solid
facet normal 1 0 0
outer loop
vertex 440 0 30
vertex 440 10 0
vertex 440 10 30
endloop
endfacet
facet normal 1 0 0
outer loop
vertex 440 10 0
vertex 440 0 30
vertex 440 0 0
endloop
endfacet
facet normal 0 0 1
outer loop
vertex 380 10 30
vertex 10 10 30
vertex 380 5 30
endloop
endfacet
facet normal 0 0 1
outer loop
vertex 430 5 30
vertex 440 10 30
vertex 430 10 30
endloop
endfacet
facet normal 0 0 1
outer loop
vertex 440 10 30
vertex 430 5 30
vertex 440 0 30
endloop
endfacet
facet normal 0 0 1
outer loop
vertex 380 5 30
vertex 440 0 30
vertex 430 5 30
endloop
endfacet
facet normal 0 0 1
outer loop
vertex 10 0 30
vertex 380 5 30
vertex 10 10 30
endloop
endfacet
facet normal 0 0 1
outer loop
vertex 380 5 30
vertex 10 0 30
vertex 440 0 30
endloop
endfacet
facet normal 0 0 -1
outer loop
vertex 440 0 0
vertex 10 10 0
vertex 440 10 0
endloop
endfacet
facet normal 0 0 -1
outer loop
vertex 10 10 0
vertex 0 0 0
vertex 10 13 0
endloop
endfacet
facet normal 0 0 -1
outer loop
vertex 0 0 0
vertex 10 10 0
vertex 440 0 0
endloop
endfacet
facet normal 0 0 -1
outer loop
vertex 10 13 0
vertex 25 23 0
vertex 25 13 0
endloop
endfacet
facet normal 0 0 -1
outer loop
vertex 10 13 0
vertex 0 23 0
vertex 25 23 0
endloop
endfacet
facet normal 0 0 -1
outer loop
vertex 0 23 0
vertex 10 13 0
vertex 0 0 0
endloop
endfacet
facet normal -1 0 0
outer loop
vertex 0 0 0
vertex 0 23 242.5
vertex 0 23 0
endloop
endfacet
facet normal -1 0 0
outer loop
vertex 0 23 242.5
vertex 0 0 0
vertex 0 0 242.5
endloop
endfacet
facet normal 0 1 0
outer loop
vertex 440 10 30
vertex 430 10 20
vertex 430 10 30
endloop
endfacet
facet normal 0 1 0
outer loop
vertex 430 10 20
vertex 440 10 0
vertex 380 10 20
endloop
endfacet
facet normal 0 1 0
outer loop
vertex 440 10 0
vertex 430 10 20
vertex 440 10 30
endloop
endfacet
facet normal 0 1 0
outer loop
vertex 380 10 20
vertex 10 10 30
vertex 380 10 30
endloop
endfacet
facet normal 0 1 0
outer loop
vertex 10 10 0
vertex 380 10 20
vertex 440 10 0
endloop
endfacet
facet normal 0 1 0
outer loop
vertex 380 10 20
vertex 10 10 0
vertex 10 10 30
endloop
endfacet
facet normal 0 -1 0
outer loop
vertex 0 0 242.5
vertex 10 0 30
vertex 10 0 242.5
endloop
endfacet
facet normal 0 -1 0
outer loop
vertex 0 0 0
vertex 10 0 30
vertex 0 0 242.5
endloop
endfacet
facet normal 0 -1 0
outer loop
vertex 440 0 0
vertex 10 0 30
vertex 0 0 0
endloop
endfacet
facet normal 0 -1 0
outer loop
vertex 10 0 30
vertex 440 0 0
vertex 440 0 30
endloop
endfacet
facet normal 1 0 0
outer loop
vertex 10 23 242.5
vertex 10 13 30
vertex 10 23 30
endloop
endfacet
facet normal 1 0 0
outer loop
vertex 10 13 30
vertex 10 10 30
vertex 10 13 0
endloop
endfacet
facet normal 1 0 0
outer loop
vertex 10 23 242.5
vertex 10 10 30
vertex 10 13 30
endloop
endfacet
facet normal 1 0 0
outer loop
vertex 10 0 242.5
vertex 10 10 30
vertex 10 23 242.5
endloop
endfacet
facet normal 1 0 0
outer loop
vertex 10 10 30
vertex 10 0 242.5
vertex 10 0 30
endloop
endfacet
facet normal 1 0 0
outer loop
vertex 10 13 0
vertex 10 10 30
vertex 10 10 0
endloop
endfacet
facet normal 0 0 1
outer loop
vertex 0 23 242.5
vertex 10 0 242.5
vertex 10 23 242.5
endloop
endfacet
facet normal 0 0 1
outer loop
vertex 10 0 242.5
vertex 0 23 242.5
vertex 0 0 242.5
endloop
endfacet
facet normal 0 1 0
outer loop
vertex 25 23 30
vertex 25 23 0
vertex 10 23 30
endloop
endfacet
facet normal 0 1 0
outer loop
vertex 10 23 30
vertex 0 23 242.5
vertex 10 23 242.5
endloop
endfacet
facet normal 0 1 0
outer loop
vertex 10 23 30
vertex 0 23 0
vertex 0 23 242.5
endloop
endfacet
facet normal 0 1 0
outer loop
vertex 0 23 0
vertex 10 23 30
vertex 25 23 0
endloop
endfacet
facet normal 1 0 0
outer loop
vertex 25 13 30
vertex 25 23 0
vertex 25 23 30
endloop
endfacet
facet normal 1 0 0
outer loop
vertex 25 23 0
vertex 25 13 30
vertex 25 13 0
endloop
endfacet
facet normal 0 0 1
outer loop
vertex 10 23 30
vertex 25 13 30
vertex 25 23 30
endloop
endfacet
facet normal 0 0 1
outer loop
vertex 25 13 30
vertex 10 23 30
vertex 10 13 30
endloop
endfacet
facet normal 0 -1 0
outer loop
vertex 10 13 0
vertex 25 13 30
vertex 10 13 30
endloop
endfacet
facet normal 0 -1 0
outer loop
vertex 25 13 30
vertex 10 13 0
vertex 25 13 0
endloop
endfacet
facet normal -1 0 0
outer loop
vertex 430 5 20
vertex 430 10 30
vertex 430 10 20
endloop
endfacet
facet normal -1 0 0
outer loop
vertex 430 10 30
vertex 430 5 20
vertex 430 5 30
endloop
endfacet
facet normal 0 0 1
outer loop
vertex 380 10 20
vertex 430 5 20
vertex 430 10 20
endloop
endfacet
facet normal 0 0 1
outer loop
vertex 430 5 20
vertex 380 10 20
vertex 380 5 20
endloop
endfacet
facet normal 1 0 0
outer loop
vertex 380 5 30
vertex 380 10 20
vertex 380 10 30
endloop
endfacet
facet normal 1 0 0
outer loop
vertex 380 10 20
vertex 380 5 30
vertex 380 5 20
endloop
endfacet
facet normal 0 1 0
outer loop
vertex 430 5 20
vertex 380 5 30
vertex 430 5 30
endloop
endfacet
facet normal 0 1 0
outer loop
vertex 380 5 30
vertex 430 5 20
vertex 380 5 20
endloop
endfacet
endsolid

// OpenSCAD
render_part_1 = true;
render_part_2 = false;
render_part_3 = false;

beam_length = 440;
beam_width = 30;
beam_thickness = 10;
beam_hook_length = 15;
beam_hook_depth = 3;

hinge_bracket_height = 48;
hinge_pin_diameter = 10;
hinge_pin_spacing = 0.6;
hinge_pin_head_spacing = 1;
hinge_pin_wall = 7;
hinge_pin_overall_diameter = hinge_pin_diameter + 2 * hinge_pin_wall;
hinge_pin_steps = $preview ? 15 : 90;
hinge_pin_ramp_height = 5;

hinge_bracket_cutaway_start = beam_length - hinge_bracket_height - beam_thickness - 1;
hinge_bracket_width = beam_width + 1.5 * beam_thickness;

hinge_pin_head_height = 30;

pin_to_wall_distance = 0.5 * hinge_pin_overall_diameter + 1.45 * beam_thickness;

cell_phone_width = 170;
cell_phone_height = 85;
cell_phone_thickness = 19;

cell_phone_opening_start = 16;
cell_phone_opening_length = 41;
cell_phone_opening_thickness = 12;

bucket_wall_thickness = 3;
bucket_floor_thickness = 12;
bucket_floor_angle = 35;
bucket_width = cell_phone_width + 2 * bucket_wall_thickness;
bucket_height = cell_phone_height + bucket_floor_thickness + hinge_pin_head_height;
bucket_thickness = cell_phone_thickness + 2 * bucket_wall_thickness;

bucket_retainer_width = 5;
bucket_retainer_height = cell_phone_height / 5;

part_2_y_offset = 60;
part_3_y_offset = 120;

// Part 1: Bracket that hangs off top of shower frame
if (render_part_1)
difference()
{
  union()
  {
    cube([beam_length, beam_thickness, beam_width]);

    cube([beam_thickness, 2 * beam_thickness + beam_hook_depth, beam_width + beam_thickness + pin_to_wall_distance + bucket_width]);

    translate([0, beam_thickness + beam_hook_depth, 0])
    cube([beam_thickness + beam_hook_length, beam_thickness, beam_width]);
  }
  
  translate([hinge_bracket_cutaway_start - 1, 0.5 * beam_thickness, beam_width - beam_thickness])
  cube([hinge_bracket_height + 2, 0.5 * beam_thickness + 2, beam_thickness + 1]);
}

// Part 2: Hinge that attaches near bottom of bracket
if (render_part_2)
union()
{
  rotate([0, 90, 0])
  translate([-(hinge_bracket_height + hinge_bracket_cutaway_start), part_2_y_offset + 0.5 * beam_thickness + hinge_pin_overall_diameter, 0.5 * beam_thickness])
  color("red")
  {
    union()
    {
      translate([hinge_bracket_cutaway_start, 0.5 * beam_thickness, beam_width - beam_thickness])
      cube([hinge_bracket_height, 0.45 * beam_thickness, beam_thickness + 2]);
      
      translate([hinge_bracket_cutaway_start, -0.5 * beam_thickness, beam_width])
      cube([hinge_bracket_height, 1.45 * beam_thickness, beam_thickness]);
      
      translate([hinge_bracket_cutaway_start, -0.5 * beam_thickness, -0.5 * beam_thickness])
      cube([hinge_bracket_height, 0.5 * beam_thickness, 1.5 * beam_thickness + beam_width - 1]);
      
      translate([hinge_bracket_cutaway_start, -0.5 * beam_thickness, -0.5 * beam_thickness])
      cube([hinge_bracket_height, 0.5 * beam_thickness + 2, 0.5 * beam_thickness]);
    }
  }
  
  color("blue")
  {
    translate([hinge_bracket_width - 0.5 * hinge_pin_overall_diameter, part_2_y_offset + hinge_pin_overall_diameter * 0.5, 0])
    difference()
    {
      union()
      {
        cylinder(hinge_bracket_height, hinge_pin_overall_diameter * 0.5, hinge_pin_overall_diameter * 0.5, $fn = hinge_pin_steps * 2);
        
        translate([-0.5 * hinge_pin_overall_diameter, 0, 0])
        cube([hinge_pin_overall_diameter, hinge_pin_overall_diameter * 0.5, hinge_bracket_height]);
      }

      translate([0, 0, -1])
      cylinder(hinge_bracket_height + 2, (hinge_pin_diameter + hinge_pin_spacing) * 0.5, (hinge_pin_diameter + hinge_pin_spacing) * 0.5, $fn = hinge_pin_steps);

      hinge_ramp();
    }
  }
}

module hinge_ramp_wedge(outer_radius, inner_radius, step, height)
{
  for (half = [0, 180])
  {
    start_angle = half + (step - 1) * 180 / hinge_pin_steps;
    end_angle = half + step * 180 / hinge_pin_steps + 0.1;
    
    start_height = hinge_bracket_height - hinge_pin_ramp_height * (step - 1) / hinge_pin_steps;
    end_height = hinge_bracket_height - hinge_pin_ramp_height * step / hinge_pin_steps;
    
    outer_start_x = outer_radius * cos(start_angle);
    outer_start_y = outer_radius * sin(start_angle);
    
    outer_end_x = outer_radius * cos(end_angle);
    outer_end_y = outer_radius * sin(end_angle);
    
    inner_start_x = inner_radius * cos(start_angle);
    inner_start_y = inner_radius * sin(start_angle);
    
    inner_end_x = inner_radius * cos(end_angle);
    inner_end_y = inner_radius * sin(end_angle);
    
    top_pt1 = [outer_start_x, outer_start_y, height];
    top_pt2 = [outer_end_x, outer_end_y, height];
    top_pt3 = [inner_end_x, inner_end_y, height];
    top_pt4 = [inner_start_x, inner_start_y, height];
    
    bottom_pt1 = [outer_start_x, outer_start_y, start_height];
    bottom_pt2 = [outer_end_x, outer_end_y, end_height];
    bottom_pt3 = [inner_end_x, inner_end_y, end_height];
    bottom_pt4 = [inner_start_x, inner_start_y, start_height];
    
    polyhedron(
      points =
        [
          top_pt1, bottom_pt1,
          top_pt2, bottom_pt2,
          top_pt3, bottom_pt3,
          top_pt4, bottom_pt4
        ],
      faces =
        [
          [0, 2, 3, 1],
          [2, 4, 5, 3],
          [4, 6, 7, 5],
          [6, 0, 1, 7],
          [0, 6, 4, 2],
          [1, 3, 5, 7]
        ]);
  }
}

module hinge_ramp(height = hinge_bracket_height + 1, spacing = 0, clear = true)
{
  outer_radius = 0.5 * (hinge_pin_overall_diameter - spacing);
  inner_radius = 0.5 * (hinge_pin_diameter - 1);
  clear_radius = hinge_pin_overall_diameter + 1;
  
  for (step = [1 : hinge_pin_steps])
  {
    hinge_ramp_wedge(outer_radius, inner_radius, step, height);
    
    if (clear)
      hinge_ramp_wedge(clear_radius, outer_radius - 0.1, step, height);
  }
}

// Part 3: Bucket that holds cell phone and sits in hinge
if (render_part_3)
color("green")
translate($preview ? [0, part_2_y_offset + 0.5 * hinge_pin_overall_diameter + pin_to_wall_distance, 0] : [0, part_3_y_offset, 0])
{
  translate([hinge_bracket_width - 0.5 * hinge_pin_overall_diameter, -pin_to_wall_distance, 0])
  union()
  {
    hinge_ramp(height = hinge_bracket_height + hinge_pin_head_height, spacing = hinge_pin_head_spacing, clear = false);
    
    cylinder(hinge_bracket_height + hinge_pin_head_height, 0.5 * hinge_pin_diameter, 0.5 * hinge_pin_diameter, $fn = hinge_pin_steps * 2);
    
    attachment_length = pin_to_wall_distance - 0.5 * bucket_thickness + hinge_pin_head_spacing + 0.5; // TODO: figure out where this 0.5 is supposed to be coming from
    
    translate([0, 0.5 * hinge_pin_overall_diameter - bucket_thickness - hinge_pin_head_spacing, hinge_bracket_height + hinge_pin_head_spacing])
    difference()
    {
      multmatrix(
        [[1, 0, 0, 0],
         [1, 1, 0, 0],
         [0, 0, 1, 0],
         [0, 0, 0, 1]])
      {
        cube([attachment_length, bucket_thickness, hinge_pin_head_height - hinge_pin_head_spacing]);
      }
      
      // Prevent attachment from sticking out the other side of the pin head
      translate([-1, -hinge_pin_overall_diameter / sqrt(2), -1])
      cube([attachment_length, hinge_pin_overall_diameter, hinge_pin_head_height + 2]);
    }
    
    translate([attachment_length, pin_to_wall_distance - bucket_thickness, hinge_bracket_height + hinge_pin_head_height - bucket_height])
    bucket();
  }
}

module bucket()
{
  union()
  {
    difference()
    {
      cube([bucket_width, bucket_thickness, bucket_height]);
      
      translate([bucket_wall_thickness, bucket_wall_thickness, bucket_floor_thickness])
      cube([cell_phone_width, bucket_thickness, cell_phone_height]);
      
      translate([0.5 * bucket_wall_thickness + cell_phone_width, bucket_wall_thickness + cell_phone_thickness - cell_phone_opening_thickness, bucket_floor_thickness + cell_phone_height - cell_phone_opening_start - cell_phone_opening_length])
      cube([2 * bucket_wall_thickness, cell_phone_opening_thickness, cell_phone_opening_length]);
      
      taper_side_length = cell_phone_opening_thickness / sqrt(2);
      
      translate([1.5 * bucket_wall_thickness + cell_phone_width, bucket_wall_thickness + cell_phone_thickness - 0.5 * cell_phone_opening_thickness, bucket_floor_thickness + cell_phone_height - cell_phone_opening_start])
      rotate([45, 0, 0])
      cube([2 * bucket_wall_thickness, taper_side_length, taper_side_length], center = true);
      
      translate([1.5 * bucket_wall_thickness + cell_phone_width, bucket_wall_thickness + cell_phone_thickness - 0.5 * cell_phone_opening_thickness, bucket_floor_thickness + cell_phone_height - cell_phone_opening_start - cell_phone_opening_length])
      rotate([45, 0, 0])
      cube([2 * bucket_wall_thickness, taper_side_length, taper_side_length], center = true);
      
      floor_angle_side_length = cell_phone_thickness / sqrt(2);
      
      translate([bucket_wall_thickness + 0.5 * cell_phone_width, bucket_wall_thickness + 0.5 * cell_phone_thickness, bucket_floor_thickness])
      scale([1, 1, sin(bucket_floor_angle) * sqrt(2)])
      rotate([45, 0, 0])
      cube([cell_phone_width, floor_angle_side_length, floor_angle_side_length], center = true);
    }
    
    difference()
    {
      translate([bucket_wall_thickness - 1, bucket_thickness - bucket_wall_thickness, bucket_floor_thickness])
      cube([bucket_retainer_width + 1, bucket_wall_thickness, bucket_retainer_height]);
      
      taper_side_length = bucket_retainer_width * sqrt(2);
      
      translate([bucket_wall_thickness + bucket_retainer_width, bucket_thickness - 0.5 * bucket_wall_thickness, bucket_floor_thickness + bucket_retainer_height])
      rotate([0, 45, 0])
      cube([taper_side_length, bucket_wall_thickness * 2, taper_side_length], center = true);
    }

    difference()
    {
      translate([bucket_wall_thickness + cell_phone_width - bucket_retainer_width, bucket_thickness - bucket_wall_thickness, bucket_floor_thickness])
      cube([bucket_retainer_width + 1, bucket_wall_thickness, bucket_retainer_height]);
      
      taper_side_length = bucket_retainer_width * sqrt(2);
      
      translate([bucket_wall_thickness + cell_phone_width - bucket_retainer_width, bucket_thickness - 0.5 * bucket_wall_thickness, bucket_floor_thickness + bucket_retainer_height])
      rotate([0, 45, 0])
      cube([taper_side_length, bucket_wall_thickness * 2, taper_side_length], center = true);
    }
  }
}
